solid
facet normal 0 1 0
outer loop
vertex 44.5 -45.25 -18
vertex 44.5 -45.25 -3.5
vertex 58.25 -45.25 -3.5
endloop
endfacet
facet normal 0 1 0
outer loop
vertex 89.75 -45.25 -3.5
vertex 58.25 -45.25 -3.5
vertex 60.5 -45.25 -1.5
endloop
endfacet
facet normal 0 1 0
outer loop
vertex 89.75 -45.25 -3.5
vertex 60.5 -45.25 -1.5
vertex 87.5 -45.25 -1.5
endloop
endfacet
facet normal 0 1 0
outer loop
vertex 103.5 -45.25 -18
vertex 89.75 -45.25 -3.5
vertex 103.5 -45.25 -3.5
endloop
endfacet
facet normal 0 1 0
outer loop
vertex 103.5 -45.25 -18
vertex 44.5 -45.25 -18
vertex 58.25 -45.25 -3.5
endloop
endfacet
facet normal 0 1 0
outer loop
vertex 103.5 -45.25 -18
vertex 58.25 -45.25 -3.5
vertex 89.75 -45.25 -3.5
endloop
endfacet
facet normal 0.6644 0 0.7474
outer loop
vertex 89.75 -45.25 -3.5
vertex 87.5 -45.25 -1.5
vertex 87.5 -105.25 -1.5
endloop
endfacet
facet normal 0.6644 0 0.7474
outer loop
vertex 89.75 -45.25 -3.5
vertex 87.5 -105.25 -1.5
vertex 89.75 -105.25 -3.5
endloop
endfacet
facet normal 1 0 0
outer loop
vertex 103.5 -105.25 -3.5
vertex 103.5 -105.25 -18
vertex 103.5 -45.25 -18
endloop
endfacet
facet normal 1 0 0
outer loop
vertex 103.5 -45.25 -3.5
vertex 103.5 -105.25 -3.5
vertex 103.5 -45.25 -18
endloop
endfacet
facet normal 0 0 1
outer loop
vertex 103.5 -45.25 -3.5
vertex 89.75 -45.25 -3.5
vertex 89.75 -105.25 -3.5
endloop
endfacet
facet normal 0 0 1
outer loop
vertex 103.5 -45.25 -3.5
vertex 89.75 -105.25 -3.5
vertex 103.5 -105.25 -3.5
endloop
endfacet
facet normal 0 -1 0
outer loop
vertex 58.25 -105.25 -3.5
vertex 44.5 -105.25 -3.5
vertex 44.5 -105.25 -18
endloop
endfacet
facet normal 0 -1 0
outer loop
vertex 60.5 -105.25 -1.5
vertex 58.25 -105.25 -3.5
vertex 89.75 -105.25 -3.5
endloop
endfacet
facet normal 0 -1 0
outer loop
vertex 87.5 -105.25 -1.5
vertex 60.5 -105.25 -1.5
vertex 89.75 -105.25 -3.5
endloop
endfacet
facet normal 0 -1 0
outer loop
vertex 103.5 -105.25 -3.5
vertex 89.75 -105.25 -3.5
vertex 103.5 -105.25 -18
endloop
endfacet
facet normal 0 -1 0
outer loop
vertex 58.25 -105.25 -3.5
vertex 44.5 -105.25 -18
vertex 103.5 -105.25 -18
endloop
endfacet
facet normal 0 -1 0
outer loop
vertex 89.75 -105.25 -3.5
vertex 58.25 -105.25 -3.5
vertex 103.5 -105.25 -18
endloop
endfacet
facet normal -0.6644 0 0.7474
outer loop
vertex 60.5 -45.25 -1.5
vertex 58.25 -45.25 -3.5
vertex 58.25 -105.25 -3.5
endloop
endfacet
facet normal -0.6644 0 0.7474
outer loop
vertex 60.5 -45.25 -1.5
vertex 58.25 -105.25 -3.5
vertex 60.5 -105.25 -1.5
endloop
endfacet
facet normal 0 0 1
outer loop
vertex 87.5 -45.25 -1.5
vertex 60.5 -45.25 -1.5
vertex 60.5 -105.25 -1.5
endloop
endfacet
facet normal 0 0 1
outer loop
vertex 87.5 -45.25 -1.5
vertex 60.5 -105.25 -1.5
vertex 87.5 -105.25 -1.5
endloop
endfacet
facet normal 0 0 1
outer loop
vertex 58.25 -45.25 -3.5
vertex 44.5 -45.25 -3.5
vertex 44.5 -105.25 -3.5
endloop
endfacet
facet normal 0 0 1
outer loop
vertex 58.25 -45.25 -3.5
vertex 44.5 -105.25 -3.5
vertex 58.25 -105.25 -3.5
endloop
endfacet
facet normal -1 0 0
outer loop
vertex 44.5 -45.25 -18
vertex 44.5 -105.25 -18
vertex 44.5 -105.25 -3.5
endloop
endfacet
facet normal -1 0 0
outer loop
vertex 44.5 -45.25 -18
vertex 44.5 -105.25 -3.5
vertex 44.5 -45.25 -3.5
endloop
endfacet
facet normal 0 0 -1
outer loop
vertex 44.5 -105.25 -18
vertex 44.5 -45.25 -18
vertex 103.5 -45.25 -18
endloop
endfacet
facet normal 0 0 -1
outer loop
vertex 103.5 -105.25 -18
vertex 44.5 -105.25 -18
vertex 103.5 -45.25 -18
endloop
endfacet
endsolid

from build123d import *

# Parameters (mm, degrees)
EXTRUDE016_DEPTH = 60
BOX014_W         = 59
BOX014_H         = 60
BOX014_DEPTH     = 14.5


with BuildPart() as cpu_cooler_top:
    # Sketch001005021 (on Face4 of Box014) → Extrude016 (new body)
    with BuildSketch(Plane(origin=(44.5, -45.25, -18), x_dir=(-1, 0, 0), z_dir=(0, 1, 0))):
        Polygon((-45.25, 14.5), (-13.75, 14.5), (-16, 16.5), (-43, 16.5), align=None)
    extrude(amount=-EXTRUDE016_DEPTH)


with BuildPart() as cpu_cooler:
    # Box014 → Box014 (new body)
    with BuildSketch(Plane(origin=(44.5, -105.25, -18), x_dir=(1, 0, 0), z_dir=(0, 0, 1))):
        with Locations((29.5, 30)):
            Rectangle(BOX014_W, BOX014_H)
    extrude(amount=BOX014_DEPTH)

    # Fusion036: union CPU-Cooler-Top
    add(cpu_cooler_top.part)


solid = cpu_cooler.part
